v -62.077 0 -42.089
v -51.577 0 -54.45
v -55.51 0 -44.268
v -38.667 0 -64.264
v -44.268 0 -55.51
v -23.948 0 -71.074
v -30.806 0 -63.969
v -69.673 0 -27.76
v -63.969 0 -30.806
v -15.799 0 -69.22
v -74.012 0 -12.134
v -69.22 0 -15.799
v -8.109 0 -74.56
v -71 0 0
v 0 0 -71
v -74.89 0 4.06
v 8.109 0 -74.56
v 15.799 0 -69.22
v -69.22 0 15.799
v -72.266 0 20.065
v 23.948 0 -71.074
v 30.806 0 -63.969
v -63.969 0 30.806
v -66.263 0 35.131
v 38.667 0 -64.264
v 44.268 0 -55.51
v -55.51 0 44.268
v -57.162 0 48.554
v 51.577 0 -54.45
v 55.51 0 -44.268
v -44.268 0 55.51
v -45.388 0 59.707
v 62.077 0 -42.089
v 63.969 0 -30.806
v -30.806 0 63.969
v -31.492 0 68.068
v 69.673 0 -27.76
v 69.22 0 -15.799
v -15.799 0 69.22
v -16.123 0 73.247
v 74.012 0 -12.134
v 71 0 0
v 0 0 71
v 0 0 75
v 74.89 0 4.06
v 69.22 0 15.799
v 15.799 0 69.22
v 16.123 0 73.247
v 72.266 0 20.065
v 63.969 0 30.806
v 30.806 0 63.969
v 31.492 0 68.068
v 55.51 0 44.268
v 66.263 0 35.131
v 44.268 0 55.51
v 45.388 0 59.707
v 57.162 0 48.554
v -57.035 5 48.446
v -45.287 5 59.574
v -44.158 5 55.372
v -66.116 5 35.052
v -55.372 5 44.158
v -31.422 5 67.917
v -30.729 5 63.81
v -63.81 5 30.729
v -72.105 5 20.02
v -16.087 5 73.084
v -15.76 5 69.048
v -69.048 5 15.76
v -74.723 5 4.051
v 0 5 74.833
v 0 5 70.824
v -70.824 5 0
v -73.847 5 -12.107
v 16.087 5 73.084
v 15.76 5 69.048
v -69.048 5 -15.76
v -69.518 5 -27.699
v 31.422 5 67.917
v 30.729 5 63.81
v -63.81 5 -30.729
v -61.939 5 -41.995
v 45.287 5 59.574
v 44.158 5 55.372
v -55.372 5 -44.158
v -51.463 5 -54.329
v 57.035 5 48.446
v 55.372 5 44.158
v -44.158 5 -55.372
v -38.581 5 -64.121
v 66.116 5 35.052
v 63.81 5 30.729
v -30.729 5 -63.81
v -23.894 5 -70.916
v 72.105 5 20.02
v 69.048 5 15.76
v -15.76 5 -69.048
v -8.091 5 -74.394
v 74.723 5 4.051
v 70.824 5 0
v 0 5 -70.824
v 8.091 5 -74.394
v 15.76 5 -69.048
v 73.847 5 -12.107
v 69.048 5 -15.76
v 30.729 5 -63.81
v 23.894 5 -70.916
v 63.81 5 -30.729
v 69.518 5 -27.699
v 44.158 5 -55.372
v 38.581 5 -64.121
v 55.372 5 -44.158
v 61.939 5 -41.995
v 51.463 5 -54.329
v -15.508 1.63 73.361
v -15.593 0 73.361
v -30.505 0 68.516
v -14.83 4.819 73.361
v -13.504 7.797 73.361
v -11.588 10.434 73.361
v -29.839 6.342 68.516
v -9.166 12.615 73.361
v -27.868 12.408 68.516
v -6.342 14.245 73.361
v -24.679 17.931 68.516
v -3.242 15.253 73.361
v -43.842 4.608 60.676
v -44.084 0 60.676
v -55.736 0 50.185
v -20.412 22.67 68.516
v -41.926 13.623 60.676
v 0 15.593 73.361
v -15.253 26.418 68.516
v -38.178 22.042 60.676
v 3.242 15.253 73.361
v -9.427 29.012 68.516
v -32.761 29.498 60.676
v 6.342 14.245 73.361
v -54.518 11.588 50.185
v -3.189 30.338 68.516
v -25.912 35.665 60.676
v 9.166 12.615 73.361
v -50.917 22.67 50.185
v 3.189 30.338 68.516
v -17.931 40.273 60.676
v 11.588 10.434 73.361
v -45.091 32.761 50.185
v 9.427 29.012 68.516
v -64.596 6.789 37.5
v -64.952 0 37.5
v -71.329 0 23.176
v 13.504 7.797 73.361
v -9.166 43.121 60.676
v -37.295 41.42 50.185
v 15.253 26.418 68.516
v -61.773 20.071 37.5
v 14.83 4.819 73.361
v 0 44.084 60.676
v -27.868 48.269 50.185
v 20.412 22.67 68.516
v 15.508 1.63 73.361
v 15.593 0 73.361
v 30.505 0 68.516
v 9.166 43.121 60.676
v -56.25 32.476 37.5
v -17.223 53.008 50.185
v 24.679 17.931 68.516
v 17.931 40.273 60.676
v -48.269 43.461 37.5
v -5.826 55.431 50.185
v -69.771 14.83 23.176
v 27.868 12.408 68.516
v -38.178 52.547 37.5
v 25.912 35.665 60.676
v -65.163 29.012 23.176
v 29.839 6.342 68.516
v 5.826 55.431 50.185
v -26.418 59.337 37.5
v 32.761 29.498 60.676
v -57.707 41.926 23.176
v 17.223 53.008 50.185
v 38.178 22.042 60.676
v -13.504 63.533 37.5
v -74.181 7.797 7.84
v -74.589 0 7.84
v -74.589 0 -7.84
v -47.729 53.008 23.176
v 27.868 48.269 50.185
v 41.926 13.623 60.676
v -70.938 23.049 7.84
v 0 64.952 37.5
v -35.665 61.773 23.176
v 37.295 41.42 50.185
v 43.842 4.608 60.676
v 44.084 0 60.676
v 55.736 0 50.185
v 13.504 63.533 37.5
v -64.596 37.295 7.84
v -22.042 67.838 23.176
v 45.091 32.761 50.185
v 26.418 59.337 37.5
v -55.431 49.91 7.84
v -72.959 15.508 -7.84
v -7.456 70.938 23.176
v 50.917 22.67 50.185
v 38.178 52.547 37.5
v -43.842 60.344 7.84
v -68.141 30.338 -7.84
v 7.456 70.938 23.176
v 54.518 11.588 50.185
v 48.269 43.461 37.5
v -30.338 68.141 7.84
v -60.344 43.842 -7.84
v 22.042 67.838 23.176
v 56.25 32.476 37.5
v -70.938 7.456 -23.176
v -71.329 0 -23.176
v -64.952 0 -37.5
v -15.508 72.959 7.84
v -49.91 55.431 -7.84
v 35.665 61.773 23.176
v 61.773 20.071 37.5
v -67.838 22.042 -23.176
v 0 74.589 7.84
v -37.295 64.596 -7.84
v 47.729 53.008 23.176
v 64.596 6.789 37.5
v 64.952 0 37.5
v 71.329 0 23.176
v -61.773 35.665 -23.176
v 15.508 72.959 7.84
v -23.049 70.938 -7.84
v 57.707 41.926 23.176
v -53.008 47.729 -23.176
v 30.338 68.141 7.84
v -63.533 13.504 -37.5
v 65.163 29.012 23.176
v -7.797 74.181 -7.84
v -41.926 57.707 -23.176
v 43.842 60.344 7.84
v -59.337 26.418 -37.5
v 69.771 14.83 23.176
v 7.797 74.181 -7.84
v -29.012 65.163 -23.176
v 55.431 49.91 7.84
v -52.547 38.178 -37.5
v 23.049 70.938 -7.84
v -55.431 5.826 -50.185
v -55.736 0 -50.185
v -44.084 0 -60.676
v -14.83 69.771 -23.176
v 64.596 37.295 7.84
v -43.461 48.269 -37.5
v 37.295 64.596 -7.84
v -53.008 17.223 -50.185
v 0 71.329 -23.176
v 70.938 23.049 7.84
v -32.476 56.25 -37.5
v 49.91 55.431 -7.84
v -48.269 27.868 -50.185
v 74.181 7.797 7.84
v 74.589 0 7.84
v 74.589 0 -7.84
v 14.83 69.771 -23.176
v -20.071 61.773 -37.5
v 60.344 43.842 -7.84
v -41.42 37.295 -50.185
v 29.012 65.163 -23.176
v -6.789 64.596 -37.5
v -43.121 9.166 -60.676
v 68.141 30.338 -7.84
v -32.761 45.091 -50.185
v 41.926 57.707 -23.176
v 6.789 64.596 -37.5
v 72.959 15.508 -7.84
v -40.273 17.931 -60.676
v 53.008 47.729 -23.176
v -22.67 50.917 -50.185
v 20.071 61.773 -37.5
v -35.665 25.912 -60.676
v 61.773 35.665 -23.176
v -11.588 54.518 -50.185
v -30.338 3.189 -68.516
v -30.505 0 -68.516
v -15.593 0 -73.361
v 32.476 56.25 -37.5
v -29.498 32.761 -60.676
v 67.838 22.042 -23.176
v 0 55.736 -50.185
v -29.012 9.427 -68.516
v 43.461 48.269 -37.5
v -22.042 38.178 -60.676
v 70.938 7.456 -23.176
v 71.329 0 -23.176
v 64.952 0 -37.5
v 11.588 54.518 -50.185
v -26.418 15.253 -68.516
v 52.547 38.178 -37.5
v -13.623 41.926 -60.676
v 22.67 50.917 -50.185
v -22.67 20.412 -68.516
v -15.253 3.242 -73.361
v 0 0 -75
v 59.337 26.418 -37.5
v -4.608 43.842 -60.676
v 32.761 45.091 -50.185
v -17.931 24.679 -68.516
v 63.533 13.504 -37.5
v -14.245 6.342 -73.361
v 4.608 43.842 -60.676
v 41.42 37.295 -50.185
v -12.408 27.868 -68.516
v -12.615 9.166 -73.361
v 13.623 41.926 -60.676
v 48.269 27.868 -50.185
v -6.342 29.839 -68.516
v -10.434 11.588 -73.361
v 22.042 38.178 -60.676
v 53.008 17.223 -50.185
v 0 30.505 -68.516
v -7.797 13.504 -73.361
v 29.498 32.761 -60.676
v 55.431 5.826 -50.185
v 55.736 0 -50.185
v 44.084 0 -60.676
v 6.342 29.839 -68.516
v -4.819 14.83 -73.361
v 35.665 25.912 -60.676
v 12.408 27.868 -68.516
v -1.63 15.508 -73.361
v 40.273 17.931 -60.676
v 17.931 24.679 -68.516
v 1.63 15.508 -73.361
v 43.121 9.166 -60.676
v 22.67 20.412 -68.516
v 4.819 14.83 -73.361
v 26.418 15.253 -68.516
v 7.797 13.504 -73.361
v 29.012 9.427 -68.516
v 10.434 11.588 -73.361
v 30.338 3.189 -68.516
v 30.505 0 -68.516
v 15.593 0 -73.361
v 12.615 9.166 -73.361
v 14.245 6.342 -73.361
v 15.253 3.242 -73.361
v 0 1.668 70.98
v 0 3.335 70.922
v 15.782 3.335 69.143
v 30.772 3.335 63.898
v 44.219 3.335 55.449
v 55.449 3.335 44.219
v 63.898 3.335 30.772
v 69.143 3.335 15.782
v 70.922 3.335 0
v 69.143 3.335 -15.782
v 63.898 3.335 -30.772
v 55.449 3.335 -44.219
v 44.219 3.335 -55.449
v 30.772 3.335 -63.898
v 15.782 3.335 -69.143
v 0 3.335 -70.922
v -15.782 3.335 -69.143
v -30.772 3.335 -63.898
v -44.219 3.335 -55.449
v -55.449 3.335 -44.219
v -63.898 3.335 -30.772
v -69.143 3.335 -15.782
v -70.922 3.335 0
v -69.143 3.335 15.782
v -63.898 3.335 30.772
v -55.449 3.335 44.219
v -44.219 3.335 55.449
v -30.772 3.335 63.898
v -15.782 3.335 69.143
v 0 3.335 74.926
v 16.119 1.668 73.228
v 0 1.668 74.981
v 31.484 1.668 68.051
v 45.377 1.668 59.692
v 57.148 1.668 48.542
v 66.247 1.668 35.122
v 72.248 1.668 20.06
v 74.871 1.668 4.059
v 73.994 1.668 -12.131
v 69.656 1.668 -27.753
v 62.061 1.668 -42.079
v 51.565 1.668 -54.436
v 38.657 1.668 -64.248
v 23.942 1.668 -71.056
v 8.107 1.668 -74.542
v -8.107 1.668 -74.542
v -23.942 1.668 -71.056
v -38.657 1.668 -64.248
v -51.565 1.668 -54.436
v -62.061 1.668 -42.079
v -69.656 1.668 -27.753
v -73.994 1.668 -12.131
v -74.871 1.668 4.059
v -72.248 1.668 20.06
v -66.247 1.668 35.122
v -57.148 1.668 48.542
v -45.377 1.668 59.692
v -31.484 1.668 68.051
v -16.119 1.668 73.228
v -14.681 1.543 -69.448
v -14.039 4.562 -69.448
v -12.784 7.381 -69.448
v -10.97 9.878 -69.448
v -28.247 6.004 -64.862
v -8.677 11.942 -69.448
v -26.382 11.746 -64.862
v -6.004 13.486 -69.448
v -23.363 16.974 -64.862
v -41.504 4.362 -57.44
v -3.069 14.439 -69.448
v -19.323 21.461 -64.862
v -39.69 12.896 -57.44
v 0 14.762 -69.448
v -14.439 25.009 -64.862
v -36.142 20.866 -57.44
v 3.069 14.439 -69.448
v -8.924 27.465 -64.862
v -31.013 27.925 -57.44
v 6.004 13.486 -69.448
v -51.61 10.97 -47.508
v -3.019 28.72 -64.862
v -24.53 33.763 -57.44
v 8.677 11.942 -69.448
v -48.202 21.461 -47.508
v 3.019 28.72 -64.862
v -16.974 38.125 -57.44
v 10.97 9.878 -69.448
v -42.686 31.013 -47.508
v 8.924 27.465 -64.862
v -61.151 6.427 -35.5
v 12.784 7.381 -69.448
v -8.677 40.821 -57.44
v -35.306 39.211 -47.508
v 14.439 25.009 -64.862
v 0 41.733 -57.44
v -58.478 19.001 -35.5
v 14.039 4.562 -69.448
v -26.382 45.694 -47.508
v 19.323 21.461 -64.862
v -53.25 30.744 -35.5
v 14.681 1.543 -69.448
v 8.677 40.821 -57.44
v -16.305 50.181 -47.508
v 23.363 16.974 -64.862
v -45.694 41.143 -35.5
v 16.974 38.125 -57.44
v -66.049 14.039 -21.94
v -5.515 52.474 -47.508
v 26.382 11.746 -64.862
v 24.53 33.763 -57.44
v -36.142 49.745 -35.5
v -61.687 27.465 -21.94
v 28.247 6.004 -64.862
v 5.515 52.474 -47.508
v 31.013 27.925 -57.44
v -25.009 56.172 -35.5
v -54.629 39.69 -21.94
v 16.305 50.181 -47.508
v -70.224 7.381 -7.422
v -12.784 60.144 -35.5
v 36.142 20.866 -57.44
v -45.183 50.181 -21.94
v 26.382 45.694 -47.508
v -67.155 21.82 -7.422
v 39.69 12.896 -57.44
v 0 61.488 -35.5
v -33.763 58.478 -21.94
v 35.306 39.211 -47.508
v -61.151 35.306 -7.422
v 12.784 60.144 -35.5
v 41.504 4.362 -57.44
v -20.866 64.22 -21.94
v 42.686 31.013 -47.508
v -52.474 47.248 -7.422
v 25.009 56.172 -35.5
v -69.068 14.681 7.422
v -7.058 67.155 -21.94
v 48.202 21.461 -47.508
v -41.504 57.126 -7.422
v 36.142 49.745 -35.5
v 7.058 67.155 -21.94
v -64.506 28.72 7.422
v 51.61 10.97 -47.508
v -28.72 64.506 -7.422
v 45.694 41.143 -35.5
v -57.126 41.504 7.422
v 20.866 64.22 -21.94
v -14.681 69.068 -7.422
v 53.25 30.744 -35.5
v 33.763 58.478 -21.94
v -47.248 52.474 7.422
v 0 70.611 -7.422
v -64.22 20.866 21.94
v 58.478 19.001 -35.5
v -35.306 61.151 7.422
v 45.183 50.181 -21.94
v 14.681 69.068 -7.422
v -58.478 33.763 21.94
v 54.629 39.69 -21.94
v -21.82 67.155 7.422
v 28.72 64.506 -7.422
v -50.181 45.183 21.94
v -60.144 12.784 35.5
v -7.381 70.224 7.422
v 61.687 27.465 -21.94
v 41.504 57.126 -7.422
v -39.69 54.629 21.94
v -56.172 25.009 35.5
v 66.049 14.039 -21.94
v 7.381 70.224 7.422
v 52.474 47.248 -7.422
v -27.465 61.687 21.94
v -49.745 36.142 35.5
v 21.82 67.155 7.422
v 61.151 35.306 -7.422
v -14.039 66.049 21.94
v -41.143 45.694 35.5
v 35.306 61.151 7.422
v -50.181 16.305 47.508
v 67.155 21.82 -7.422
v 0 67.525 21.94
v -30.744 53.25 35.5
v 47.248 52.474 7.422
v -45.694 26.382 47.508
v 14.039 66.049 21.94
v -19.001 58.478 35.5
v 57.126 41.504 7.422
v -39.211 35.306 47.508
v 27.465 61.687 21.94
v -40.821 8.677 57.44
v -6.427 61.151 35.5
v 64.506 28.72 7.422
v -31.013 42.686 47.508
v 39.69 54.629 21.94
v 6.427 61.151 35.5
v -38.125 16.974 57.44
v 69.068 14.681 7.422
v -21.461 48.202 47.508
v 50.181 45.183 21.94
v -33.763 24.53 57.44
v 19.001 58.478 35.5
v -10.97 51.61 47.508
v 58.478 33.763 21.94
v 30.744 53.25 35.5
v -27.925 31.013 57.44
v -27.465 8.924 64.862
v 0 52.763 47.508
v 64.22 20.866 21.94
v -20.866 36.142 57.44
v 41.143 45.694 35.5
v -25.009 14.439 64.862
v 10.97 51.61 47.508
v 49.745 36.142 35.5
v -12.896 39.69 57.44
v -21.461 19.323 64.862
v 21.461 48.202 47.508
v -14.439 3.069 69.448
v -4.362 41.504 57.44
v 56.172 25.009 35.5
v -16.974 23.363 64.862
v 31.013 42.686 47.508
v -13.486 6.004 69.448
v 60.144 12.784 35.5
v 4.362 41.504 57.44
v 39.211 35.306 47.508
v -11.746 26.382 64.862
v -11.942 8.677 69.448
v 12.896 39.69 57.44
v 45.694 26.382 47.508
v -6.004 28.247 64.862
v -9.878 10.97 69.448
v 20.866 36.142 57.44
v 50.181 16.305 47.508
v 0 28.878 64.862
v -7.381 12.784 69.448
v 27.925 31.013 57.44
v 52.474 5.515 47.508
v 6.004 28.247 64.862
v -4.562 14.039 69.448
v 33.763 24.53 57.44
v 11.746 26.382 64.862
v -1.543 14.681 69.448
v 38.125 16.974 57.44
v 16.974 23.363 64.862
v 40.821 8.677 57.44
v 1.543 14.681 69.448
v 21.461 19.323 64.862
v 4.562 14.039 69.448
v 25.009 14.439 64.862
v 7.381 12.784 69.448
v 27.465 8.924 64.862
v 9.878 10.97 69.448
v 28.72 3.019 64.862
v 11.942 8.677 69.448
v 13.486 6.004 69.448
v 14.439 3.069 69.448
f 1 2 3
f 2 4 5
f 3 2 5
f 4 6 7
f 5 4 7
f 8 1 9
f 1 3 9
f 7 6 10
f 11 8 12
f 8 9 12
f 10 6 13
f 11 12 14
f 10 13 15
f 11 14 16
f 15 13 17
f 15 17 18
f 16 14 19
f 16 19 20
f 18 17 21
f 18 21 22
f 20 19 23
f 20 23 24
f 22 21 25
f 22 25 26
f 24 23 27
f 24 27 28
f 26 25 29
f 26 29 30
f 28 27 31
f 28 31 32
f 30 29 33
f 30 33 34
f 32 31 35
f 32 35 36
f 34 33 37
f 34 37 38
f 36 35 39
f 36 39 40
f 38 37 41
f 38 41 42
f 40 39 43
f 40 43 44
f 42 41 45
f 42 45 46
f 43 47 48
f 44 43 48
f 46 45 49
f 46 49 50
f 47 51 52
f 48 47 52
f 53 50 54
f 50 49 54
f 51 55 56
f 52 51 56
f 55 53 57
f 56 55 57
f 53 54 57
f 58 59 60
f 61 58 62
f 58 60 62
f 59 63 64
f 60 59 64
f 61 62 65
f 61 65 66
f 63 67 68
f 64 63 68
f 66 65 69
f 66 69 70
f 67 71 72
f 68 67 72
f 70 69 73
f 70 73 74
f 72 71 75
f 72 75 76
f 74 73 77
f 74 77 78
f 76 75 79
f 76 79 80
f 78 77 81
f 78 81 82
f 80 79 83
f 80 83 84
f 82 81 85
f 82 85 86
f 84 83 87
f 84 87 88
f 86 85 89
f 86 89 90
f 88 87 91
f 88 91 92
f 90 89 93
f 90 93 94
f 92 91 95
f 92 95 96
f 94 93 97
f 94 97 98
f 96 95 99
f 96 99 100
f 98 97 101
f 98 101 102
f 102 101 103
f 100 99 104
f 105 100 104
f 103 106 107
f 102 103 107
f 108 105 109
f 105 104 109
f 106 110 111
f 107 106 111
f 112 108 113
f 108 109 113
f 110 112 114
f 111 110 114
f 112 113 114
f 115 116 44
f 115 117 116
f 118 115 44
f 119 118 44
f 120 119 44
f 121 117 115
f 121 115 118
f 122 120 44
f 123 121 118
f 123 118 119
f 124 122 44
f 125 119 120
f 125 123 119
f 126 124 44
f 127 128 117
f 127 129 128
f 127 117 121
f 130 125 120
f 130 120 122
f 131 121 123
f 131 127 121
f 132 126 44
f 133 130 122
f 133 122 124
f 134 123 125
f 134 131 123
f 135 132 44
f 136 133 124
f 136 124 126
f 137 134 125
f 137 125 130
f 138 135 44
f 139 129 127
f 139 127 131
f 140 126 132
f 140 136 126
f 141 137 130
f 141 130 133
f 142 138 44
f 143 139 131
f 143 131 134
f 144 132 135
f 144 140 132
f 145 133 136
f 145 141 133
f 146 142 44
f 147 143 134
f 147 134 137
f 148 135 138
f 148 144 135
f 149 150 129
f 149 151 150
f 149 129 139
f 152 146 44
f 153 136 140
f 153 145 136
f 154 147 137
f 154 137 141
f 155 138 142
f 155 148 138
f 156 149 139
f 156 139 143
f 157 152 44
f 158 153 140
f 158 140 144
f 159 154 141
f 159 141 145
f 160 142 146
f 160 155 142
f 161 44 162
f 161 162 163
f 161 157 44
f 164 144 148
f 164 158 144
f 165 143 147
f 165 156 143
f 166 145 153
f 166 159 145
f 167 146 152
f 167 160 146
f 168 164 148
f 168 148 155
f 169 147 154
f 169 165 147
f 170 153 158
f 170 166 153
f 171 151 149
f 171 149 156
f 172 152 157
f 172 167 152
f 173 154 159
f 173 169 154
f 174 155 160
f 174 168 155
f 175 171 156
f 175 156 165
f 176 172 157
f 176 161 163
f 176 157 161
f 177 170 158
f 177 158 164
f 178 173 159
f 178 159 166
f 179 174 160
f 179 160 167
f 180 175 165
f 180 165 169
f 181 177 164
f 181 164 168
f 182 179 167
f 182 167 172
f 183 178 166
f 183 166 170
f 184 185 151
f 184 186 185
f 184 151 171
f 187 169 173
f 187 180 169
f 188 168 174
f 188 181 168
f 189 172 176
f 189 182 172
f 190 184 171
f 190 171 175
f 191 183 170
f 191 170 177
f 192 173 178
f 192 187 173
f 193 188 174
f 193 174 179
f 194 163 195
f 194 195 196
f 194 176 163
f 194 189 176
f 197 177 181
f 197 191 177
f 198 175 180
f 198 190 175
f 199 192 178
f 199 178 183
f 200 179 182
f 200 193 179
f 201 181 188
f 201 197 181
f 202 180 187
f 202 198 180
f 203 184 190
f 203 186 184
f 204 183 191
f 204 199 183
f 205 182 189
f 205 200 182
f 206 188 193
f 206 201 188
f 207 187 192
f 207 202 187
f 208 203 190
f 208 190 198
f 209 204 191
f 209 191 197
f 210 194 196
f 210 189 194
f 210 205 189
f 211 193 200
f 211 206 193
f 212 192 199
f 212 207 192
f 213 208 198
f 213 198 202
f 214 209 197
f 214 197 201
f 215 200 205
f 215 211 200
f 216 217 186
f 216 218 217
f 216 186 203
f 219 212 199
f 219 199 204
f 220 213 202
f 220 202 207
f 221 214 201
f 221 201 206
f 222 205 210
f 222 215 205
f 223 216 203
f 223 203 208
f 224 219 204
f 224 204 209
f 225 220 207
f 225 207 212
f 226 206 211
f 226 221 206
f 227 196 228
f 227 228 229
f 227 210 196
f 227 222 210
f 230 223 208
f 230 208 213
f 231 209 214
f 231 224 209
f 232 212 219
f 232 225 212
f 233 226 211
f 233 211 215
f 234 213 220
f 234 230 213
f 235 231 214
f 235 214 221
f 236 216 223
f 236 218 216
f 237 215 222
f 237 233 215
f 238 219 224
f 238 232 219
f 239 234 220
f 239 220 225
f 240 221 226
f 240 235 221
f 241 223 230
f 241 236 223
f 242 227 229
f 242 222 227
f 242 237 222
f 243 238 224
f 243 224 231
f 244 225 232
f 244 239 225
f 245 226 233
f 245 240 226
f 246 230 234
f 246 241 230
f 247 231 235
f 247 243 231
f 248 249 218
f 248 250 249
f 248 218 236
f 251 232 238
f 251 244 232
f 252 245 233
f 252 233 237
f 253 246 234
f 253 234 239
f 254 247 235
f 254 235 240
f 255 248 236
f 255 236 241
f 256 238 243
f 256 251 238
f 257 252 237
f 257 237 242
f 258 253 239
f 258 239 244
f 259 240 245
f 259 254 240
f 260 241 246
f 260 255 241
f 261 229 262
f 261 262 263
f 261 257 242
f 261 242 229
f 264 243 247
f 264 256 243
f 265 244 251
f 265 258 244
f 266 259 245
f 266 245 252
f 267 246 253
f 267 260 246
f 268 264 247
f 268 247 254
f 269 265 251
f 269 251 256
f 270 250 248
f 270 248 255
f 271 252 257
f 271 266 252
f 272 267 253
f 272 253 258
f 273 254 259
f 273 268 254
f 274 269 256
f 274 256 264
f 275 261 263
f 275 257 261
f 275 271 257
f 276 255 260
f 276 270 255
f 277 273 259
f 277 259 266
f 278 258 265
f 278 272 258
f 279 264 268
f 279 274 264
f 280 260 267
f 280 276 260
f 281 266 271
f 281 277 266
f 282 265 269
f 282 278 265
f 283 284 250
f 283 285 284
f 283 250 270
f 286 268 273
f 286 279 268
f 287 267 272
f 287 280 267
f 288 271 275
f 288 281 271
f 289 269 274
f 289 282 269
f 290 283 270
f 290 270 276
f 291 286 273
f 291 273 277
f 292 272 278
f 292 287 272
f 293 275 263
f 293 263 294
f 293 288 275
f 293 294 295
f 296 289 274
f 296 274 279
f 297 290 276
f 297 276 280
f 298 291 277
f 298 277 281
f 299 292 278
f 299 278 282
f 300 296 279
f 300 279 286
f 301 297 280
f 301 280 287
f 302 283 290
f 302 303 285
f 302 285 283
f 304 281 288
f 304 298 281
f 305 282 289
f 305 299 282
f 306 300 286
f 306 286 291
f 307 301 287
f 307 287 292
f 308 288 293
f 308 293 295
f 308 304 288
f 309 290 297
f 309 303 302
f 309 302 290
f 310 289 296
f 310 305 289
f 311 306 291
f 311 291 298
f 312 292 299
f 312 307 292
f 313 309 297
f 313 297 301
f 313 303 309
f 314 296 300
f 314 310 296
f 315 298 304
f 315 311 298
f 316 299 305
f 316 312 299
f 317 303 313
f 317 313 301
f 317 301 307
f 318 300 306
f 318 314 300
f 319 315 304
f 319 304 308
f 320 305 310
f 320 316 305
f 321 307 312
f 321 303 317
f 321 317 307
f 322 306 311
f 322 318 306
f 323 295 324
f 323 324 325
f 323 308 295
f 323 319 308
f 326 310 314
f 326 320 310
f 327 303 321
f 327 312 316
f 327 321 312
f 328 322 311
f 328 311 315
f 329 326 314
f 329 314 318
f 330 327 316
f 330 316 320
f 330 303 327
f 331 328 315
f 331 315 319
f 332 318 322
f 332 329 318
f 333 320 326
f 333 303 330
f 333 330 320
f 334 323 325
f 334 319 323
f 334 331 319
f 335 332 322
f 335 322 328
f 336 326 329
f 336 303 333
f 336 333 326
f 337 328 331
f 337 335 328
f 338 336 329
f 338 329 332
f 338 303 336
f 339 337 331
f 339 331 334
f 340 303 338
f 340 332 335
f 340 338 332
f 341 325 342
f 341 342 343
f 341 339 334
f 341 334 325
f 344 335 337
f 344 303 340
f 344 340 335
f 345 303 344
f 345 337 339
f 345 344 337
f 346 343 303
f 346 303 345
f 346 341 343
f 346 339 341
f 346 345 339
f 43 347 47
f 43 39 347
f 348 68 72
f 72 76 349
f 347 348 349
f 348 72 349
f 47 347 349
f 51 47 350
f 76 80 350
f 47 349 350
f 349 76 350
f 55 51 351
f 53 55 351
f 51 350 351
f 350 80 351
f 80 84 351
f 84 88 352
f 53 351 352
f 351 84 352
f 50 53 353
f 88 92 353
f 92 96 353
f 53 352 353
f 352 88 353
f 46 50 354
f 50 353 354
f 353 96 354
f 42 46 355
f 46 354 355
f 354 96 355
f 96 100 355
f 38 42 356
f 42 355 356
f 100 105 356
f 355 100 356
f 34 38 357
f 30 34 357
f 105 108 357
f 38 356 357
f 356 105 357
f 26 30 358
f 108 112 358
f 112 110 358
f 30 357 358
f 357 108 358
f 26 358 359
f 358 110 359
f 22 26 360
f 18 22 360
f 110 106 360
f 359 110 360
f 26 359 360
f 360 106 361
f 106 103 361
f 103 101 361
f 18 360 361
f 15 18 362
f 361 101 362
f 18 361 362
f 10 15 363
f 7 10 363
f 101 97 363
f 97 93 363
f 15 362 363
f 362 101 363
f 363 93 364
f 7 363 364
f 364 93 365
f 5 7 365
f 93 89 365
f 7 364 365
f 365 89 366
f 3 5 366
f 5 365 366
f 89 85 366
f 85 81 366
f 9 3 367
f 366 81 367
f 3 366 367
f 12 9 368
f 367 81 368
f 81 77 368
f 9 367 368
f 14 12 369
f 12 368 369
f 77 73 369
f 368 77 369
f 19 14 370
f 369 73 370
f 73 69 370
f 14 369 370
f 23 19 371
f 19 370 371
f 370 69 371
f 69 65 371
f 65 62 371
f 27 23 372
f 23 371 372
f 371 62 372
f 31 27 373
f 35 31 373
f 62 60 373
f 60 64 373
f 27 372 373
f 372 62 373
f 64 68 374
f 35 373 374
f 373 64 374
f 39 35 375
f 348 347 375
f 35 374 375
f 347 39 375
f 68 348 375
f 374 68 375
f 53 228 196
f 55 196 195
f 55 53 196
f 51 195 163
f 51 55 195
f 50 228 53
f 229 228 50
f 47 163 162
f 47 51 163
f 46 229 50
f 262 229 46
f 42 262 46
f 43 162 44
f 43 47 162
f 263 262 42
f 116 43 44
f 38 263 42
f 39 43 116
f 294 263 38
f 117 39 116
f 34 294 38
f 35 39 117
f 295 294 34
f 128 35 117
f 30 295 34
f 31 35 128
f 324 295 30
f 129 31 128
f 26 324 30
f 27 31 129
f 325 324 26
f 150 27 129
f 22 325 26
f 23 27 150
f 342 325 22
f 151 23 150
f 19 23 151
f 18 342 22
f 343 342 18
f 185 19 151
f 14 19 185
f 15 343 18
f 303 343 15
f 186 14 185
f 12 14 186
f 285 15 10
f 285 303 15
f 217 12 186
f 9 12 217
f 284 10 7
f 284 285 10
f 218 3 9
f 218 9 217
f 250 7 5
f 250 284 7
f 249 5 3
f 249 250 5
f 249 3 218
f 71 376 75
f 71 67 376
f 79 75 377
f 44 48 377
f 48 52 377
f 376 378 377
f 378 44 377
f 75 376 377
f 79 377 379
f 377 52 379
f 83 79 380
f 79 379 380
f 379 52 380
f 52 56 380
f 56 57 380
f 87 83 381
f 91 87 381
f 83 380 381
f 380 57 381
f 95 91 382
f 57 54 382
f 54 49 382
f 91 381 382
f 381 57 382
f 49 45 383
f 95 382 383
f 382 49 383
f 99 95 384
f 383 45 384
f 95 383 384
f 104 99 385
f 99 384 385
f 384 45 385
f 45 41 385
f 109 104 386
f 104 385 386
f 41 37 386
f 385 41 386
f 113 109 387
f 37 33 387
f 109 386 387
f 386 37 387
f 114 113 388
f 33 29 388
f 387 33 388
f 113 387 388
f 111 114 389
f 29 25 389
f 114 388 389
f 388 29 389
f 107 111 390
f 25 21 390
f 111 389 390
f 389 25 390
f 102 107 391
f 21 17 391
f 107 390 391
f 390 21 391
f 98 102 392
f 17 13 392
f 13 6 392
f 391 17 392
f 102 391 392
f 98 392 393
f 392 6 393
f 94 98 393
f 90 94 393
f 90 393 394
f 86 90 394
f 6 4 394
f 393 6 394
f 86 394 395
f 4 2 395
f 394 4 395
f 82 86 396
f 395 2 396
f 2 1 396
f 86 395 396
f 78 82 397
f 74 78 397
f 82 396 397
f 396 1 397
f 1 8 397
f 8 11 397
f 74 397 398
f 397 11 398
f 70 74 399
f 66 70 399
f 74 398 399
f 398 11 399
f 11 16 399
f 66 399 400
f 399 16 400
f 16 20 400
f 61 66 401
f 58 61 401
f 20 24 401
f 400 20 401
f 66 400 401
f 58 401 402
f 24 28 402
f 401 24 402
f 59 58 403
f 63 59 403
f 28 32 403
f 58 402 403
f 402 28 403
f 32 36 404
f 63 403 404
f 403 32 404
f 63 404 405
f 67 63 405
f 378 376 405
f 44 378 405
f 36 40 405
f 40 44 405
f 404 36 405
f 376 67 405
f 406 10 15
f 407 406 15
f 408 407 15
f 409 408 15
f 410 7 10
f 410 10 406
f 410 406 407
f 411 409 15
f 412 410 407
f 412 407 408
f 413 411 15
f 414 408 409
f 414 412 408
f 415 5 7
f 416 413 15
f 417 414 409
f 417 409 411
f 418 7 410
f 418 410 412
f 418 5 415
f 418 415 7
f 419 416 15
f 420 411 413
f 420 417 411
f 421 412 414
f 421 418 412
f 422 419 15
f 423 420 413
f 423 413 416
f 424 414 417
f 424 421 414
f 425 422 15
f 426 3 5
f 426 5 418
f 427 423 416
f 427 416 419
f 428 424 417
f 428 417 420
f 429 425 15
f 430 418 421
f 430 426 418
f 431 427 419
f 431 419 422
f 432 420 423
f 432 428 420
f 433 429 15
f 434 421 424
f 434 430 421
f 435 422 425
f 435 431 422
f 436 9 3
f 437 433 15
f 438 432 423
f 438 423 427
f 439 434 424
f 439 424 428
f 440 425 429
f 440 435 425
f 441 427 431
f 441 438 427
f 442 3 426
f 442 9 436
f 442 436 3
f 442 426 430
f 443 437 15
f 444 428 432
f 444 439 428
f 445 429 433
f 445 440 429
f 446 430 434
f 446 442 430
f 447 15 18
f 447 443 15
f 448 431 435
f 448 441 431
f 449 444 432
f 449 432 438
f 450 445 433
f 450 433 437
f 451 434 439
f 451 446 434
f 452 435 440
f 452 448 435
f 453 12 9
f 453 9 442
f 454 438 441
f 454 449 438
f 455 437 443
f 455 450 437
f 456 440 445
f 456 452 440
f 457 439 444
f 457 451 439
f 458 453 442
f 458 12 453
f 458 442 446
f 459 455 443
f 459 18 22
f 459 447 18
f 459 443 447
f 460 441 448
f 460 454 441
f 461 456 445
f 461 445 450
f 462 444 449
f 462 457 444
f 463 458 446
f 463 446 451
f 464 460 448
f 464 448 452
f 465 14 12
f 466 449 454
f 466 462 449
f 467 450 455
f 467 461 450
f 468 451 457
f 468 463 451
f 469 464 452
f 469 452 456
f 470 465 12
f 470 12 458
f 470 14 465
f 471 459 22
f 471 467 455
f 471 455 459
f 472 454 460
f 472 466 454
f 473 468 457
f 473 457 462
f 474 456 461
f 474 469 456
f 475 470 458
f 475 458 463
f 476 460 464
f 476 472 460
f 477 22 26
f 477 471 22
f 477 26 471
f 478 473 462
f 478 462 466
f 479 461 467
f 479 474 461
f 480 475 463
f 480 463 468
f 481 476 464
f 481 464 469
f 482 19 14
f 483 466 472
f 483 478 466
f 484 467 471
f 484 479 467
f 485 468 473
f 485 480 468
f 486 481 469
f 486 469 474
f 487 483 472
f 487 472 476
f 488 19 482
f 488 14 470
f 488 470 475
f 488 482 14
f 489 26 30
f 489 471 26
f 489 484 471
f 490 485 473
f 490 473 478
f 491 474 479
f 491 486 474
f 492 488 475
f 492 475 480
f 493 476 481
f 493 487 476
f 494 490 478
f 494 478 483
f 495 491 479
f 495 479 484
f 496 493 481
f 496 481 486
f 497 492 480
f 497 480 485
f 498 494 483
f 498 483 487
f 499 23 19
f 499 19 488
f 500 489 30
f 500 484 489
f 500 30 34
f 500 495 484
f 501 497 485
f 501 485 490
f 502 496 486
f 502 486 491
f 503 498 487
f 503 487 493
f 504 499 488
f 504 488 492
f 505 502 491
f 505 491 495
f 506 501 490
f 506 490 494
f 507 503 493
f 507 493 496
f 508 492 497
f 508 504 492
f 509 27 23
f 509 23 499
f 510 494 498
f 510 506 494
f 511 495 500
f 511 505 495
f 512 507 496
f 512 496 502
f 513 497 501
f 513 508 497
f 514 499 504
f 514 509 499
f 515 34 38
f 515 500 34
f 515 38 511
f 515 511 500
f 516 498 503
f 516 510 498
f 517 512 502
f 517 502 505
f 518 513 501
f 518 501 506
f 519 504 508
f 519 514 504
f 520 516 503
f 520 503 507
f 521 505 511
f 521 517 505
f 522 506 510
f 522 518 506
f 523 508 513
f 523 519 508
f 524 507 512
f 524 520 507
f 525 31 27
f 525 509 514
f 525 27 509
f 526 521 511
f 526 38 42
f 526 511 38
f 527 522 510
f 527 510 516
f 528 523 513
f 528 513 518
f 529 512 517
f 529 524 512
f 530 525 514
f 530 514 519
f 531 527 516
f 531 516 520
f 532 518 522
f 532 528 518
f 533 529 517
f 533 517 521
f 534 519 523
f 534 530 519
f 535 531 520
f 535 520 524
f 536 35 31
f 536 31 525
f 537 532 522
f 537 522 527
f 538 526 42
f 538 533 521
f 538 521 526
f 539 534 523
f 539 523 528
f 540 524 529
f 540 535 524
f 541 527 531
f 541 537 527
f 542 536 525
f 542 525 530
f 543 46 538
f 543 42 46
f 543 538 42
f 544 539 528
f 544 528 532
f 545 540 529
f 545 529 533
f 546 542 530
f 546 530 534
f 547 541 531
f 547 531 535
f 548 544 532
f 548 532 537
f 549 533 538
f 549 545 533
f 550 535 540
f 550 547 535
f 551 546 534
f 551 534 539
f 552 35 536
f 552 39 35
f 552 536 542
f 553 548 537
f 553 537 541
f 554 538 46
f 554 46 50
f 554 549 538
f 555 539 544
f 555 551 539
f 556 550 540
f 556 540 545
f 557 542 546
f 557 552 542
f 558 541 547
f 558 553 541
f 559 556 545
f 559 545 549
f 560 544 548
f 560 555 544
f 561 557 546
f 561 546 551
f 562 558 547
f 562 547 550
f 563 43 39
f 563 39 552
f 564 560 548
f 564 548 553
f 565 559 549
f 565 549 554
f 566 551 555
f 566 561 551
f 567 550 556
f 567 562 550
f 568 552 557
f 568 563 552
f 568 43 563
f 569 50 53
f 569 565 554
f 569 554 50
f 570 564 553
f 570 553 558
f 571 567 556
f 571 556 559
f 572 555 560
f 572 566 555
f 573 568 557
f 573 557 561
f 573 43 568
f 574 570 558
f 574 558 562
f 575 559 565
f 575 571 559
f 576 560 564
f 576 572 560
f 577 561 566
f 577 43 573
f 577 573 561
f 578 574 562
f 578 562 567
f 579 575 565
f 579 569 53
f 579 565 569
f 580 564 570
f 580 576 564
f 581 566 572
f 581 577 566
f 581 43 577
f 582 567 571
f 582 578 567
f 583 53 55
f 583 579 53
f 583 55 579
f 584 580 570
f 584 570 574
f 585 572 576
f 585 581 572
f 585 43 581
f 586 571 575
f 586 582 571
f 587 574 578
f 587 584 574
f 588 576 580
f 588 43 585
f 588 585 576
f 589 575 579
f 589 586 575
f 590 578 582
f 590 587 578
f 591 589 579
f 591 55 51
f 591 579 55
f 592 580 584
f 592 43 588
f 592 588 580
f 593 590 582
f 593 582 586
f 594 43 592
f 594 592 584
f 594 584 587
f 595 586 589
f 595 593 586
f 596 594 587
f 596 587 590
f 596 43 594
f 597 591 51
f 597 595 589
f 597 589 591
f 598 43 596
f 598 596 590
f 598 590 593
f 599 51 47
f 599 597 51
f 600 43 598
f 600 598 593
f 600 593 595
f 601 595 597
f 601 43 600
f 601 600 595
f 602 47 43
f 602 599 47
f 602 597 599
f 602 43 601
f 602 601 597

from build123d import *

# Parameters (mm, degrees)
SHELL_ANGLE = 180


with BuildPart() as part:
    # Sketch9 → Shell (revolve)
    with BuildSketch(Plane(origin=(0, 0, 0), x_dir=(1, 0, 0), z_dir=(0, 1, 0))):
        with BuildLine():
            Line((0, 75), (0, 71))
            ThreePointArc((0, 71), (-71, 0), (0, -71))
            Line((0, -71), (0, -75))
            ThreePointArc((0, -75), (-75, 0), (0, 75))
        make_face()
    revolve(axis=Axis((0, 0, -75), (0, 0, -1)), revolution_arc=SHELL_ANGLE)


with BuildPart() as body_2:
    # Sketch4 → Base (revolve)
    with BuildSketch(Plane.XY):
        with BuildLine():
            Line((-75, 0), (-71, 0))
            ThreePointArc((-71, 0), (-70.955917525, 2.501553164), (-70.823724839, 5))
            Line((-70.823724839, 5), (-74.833147735, 5))
            ThreePointArc((-74.833147735, 5), (-74.958275328, 2.501391597), (-75, 0))
        make_face()
    revolve(axis=Axis((0, 0, 0), (0, 1, 0)))


solid = Compound([part.part, body_2.part])
